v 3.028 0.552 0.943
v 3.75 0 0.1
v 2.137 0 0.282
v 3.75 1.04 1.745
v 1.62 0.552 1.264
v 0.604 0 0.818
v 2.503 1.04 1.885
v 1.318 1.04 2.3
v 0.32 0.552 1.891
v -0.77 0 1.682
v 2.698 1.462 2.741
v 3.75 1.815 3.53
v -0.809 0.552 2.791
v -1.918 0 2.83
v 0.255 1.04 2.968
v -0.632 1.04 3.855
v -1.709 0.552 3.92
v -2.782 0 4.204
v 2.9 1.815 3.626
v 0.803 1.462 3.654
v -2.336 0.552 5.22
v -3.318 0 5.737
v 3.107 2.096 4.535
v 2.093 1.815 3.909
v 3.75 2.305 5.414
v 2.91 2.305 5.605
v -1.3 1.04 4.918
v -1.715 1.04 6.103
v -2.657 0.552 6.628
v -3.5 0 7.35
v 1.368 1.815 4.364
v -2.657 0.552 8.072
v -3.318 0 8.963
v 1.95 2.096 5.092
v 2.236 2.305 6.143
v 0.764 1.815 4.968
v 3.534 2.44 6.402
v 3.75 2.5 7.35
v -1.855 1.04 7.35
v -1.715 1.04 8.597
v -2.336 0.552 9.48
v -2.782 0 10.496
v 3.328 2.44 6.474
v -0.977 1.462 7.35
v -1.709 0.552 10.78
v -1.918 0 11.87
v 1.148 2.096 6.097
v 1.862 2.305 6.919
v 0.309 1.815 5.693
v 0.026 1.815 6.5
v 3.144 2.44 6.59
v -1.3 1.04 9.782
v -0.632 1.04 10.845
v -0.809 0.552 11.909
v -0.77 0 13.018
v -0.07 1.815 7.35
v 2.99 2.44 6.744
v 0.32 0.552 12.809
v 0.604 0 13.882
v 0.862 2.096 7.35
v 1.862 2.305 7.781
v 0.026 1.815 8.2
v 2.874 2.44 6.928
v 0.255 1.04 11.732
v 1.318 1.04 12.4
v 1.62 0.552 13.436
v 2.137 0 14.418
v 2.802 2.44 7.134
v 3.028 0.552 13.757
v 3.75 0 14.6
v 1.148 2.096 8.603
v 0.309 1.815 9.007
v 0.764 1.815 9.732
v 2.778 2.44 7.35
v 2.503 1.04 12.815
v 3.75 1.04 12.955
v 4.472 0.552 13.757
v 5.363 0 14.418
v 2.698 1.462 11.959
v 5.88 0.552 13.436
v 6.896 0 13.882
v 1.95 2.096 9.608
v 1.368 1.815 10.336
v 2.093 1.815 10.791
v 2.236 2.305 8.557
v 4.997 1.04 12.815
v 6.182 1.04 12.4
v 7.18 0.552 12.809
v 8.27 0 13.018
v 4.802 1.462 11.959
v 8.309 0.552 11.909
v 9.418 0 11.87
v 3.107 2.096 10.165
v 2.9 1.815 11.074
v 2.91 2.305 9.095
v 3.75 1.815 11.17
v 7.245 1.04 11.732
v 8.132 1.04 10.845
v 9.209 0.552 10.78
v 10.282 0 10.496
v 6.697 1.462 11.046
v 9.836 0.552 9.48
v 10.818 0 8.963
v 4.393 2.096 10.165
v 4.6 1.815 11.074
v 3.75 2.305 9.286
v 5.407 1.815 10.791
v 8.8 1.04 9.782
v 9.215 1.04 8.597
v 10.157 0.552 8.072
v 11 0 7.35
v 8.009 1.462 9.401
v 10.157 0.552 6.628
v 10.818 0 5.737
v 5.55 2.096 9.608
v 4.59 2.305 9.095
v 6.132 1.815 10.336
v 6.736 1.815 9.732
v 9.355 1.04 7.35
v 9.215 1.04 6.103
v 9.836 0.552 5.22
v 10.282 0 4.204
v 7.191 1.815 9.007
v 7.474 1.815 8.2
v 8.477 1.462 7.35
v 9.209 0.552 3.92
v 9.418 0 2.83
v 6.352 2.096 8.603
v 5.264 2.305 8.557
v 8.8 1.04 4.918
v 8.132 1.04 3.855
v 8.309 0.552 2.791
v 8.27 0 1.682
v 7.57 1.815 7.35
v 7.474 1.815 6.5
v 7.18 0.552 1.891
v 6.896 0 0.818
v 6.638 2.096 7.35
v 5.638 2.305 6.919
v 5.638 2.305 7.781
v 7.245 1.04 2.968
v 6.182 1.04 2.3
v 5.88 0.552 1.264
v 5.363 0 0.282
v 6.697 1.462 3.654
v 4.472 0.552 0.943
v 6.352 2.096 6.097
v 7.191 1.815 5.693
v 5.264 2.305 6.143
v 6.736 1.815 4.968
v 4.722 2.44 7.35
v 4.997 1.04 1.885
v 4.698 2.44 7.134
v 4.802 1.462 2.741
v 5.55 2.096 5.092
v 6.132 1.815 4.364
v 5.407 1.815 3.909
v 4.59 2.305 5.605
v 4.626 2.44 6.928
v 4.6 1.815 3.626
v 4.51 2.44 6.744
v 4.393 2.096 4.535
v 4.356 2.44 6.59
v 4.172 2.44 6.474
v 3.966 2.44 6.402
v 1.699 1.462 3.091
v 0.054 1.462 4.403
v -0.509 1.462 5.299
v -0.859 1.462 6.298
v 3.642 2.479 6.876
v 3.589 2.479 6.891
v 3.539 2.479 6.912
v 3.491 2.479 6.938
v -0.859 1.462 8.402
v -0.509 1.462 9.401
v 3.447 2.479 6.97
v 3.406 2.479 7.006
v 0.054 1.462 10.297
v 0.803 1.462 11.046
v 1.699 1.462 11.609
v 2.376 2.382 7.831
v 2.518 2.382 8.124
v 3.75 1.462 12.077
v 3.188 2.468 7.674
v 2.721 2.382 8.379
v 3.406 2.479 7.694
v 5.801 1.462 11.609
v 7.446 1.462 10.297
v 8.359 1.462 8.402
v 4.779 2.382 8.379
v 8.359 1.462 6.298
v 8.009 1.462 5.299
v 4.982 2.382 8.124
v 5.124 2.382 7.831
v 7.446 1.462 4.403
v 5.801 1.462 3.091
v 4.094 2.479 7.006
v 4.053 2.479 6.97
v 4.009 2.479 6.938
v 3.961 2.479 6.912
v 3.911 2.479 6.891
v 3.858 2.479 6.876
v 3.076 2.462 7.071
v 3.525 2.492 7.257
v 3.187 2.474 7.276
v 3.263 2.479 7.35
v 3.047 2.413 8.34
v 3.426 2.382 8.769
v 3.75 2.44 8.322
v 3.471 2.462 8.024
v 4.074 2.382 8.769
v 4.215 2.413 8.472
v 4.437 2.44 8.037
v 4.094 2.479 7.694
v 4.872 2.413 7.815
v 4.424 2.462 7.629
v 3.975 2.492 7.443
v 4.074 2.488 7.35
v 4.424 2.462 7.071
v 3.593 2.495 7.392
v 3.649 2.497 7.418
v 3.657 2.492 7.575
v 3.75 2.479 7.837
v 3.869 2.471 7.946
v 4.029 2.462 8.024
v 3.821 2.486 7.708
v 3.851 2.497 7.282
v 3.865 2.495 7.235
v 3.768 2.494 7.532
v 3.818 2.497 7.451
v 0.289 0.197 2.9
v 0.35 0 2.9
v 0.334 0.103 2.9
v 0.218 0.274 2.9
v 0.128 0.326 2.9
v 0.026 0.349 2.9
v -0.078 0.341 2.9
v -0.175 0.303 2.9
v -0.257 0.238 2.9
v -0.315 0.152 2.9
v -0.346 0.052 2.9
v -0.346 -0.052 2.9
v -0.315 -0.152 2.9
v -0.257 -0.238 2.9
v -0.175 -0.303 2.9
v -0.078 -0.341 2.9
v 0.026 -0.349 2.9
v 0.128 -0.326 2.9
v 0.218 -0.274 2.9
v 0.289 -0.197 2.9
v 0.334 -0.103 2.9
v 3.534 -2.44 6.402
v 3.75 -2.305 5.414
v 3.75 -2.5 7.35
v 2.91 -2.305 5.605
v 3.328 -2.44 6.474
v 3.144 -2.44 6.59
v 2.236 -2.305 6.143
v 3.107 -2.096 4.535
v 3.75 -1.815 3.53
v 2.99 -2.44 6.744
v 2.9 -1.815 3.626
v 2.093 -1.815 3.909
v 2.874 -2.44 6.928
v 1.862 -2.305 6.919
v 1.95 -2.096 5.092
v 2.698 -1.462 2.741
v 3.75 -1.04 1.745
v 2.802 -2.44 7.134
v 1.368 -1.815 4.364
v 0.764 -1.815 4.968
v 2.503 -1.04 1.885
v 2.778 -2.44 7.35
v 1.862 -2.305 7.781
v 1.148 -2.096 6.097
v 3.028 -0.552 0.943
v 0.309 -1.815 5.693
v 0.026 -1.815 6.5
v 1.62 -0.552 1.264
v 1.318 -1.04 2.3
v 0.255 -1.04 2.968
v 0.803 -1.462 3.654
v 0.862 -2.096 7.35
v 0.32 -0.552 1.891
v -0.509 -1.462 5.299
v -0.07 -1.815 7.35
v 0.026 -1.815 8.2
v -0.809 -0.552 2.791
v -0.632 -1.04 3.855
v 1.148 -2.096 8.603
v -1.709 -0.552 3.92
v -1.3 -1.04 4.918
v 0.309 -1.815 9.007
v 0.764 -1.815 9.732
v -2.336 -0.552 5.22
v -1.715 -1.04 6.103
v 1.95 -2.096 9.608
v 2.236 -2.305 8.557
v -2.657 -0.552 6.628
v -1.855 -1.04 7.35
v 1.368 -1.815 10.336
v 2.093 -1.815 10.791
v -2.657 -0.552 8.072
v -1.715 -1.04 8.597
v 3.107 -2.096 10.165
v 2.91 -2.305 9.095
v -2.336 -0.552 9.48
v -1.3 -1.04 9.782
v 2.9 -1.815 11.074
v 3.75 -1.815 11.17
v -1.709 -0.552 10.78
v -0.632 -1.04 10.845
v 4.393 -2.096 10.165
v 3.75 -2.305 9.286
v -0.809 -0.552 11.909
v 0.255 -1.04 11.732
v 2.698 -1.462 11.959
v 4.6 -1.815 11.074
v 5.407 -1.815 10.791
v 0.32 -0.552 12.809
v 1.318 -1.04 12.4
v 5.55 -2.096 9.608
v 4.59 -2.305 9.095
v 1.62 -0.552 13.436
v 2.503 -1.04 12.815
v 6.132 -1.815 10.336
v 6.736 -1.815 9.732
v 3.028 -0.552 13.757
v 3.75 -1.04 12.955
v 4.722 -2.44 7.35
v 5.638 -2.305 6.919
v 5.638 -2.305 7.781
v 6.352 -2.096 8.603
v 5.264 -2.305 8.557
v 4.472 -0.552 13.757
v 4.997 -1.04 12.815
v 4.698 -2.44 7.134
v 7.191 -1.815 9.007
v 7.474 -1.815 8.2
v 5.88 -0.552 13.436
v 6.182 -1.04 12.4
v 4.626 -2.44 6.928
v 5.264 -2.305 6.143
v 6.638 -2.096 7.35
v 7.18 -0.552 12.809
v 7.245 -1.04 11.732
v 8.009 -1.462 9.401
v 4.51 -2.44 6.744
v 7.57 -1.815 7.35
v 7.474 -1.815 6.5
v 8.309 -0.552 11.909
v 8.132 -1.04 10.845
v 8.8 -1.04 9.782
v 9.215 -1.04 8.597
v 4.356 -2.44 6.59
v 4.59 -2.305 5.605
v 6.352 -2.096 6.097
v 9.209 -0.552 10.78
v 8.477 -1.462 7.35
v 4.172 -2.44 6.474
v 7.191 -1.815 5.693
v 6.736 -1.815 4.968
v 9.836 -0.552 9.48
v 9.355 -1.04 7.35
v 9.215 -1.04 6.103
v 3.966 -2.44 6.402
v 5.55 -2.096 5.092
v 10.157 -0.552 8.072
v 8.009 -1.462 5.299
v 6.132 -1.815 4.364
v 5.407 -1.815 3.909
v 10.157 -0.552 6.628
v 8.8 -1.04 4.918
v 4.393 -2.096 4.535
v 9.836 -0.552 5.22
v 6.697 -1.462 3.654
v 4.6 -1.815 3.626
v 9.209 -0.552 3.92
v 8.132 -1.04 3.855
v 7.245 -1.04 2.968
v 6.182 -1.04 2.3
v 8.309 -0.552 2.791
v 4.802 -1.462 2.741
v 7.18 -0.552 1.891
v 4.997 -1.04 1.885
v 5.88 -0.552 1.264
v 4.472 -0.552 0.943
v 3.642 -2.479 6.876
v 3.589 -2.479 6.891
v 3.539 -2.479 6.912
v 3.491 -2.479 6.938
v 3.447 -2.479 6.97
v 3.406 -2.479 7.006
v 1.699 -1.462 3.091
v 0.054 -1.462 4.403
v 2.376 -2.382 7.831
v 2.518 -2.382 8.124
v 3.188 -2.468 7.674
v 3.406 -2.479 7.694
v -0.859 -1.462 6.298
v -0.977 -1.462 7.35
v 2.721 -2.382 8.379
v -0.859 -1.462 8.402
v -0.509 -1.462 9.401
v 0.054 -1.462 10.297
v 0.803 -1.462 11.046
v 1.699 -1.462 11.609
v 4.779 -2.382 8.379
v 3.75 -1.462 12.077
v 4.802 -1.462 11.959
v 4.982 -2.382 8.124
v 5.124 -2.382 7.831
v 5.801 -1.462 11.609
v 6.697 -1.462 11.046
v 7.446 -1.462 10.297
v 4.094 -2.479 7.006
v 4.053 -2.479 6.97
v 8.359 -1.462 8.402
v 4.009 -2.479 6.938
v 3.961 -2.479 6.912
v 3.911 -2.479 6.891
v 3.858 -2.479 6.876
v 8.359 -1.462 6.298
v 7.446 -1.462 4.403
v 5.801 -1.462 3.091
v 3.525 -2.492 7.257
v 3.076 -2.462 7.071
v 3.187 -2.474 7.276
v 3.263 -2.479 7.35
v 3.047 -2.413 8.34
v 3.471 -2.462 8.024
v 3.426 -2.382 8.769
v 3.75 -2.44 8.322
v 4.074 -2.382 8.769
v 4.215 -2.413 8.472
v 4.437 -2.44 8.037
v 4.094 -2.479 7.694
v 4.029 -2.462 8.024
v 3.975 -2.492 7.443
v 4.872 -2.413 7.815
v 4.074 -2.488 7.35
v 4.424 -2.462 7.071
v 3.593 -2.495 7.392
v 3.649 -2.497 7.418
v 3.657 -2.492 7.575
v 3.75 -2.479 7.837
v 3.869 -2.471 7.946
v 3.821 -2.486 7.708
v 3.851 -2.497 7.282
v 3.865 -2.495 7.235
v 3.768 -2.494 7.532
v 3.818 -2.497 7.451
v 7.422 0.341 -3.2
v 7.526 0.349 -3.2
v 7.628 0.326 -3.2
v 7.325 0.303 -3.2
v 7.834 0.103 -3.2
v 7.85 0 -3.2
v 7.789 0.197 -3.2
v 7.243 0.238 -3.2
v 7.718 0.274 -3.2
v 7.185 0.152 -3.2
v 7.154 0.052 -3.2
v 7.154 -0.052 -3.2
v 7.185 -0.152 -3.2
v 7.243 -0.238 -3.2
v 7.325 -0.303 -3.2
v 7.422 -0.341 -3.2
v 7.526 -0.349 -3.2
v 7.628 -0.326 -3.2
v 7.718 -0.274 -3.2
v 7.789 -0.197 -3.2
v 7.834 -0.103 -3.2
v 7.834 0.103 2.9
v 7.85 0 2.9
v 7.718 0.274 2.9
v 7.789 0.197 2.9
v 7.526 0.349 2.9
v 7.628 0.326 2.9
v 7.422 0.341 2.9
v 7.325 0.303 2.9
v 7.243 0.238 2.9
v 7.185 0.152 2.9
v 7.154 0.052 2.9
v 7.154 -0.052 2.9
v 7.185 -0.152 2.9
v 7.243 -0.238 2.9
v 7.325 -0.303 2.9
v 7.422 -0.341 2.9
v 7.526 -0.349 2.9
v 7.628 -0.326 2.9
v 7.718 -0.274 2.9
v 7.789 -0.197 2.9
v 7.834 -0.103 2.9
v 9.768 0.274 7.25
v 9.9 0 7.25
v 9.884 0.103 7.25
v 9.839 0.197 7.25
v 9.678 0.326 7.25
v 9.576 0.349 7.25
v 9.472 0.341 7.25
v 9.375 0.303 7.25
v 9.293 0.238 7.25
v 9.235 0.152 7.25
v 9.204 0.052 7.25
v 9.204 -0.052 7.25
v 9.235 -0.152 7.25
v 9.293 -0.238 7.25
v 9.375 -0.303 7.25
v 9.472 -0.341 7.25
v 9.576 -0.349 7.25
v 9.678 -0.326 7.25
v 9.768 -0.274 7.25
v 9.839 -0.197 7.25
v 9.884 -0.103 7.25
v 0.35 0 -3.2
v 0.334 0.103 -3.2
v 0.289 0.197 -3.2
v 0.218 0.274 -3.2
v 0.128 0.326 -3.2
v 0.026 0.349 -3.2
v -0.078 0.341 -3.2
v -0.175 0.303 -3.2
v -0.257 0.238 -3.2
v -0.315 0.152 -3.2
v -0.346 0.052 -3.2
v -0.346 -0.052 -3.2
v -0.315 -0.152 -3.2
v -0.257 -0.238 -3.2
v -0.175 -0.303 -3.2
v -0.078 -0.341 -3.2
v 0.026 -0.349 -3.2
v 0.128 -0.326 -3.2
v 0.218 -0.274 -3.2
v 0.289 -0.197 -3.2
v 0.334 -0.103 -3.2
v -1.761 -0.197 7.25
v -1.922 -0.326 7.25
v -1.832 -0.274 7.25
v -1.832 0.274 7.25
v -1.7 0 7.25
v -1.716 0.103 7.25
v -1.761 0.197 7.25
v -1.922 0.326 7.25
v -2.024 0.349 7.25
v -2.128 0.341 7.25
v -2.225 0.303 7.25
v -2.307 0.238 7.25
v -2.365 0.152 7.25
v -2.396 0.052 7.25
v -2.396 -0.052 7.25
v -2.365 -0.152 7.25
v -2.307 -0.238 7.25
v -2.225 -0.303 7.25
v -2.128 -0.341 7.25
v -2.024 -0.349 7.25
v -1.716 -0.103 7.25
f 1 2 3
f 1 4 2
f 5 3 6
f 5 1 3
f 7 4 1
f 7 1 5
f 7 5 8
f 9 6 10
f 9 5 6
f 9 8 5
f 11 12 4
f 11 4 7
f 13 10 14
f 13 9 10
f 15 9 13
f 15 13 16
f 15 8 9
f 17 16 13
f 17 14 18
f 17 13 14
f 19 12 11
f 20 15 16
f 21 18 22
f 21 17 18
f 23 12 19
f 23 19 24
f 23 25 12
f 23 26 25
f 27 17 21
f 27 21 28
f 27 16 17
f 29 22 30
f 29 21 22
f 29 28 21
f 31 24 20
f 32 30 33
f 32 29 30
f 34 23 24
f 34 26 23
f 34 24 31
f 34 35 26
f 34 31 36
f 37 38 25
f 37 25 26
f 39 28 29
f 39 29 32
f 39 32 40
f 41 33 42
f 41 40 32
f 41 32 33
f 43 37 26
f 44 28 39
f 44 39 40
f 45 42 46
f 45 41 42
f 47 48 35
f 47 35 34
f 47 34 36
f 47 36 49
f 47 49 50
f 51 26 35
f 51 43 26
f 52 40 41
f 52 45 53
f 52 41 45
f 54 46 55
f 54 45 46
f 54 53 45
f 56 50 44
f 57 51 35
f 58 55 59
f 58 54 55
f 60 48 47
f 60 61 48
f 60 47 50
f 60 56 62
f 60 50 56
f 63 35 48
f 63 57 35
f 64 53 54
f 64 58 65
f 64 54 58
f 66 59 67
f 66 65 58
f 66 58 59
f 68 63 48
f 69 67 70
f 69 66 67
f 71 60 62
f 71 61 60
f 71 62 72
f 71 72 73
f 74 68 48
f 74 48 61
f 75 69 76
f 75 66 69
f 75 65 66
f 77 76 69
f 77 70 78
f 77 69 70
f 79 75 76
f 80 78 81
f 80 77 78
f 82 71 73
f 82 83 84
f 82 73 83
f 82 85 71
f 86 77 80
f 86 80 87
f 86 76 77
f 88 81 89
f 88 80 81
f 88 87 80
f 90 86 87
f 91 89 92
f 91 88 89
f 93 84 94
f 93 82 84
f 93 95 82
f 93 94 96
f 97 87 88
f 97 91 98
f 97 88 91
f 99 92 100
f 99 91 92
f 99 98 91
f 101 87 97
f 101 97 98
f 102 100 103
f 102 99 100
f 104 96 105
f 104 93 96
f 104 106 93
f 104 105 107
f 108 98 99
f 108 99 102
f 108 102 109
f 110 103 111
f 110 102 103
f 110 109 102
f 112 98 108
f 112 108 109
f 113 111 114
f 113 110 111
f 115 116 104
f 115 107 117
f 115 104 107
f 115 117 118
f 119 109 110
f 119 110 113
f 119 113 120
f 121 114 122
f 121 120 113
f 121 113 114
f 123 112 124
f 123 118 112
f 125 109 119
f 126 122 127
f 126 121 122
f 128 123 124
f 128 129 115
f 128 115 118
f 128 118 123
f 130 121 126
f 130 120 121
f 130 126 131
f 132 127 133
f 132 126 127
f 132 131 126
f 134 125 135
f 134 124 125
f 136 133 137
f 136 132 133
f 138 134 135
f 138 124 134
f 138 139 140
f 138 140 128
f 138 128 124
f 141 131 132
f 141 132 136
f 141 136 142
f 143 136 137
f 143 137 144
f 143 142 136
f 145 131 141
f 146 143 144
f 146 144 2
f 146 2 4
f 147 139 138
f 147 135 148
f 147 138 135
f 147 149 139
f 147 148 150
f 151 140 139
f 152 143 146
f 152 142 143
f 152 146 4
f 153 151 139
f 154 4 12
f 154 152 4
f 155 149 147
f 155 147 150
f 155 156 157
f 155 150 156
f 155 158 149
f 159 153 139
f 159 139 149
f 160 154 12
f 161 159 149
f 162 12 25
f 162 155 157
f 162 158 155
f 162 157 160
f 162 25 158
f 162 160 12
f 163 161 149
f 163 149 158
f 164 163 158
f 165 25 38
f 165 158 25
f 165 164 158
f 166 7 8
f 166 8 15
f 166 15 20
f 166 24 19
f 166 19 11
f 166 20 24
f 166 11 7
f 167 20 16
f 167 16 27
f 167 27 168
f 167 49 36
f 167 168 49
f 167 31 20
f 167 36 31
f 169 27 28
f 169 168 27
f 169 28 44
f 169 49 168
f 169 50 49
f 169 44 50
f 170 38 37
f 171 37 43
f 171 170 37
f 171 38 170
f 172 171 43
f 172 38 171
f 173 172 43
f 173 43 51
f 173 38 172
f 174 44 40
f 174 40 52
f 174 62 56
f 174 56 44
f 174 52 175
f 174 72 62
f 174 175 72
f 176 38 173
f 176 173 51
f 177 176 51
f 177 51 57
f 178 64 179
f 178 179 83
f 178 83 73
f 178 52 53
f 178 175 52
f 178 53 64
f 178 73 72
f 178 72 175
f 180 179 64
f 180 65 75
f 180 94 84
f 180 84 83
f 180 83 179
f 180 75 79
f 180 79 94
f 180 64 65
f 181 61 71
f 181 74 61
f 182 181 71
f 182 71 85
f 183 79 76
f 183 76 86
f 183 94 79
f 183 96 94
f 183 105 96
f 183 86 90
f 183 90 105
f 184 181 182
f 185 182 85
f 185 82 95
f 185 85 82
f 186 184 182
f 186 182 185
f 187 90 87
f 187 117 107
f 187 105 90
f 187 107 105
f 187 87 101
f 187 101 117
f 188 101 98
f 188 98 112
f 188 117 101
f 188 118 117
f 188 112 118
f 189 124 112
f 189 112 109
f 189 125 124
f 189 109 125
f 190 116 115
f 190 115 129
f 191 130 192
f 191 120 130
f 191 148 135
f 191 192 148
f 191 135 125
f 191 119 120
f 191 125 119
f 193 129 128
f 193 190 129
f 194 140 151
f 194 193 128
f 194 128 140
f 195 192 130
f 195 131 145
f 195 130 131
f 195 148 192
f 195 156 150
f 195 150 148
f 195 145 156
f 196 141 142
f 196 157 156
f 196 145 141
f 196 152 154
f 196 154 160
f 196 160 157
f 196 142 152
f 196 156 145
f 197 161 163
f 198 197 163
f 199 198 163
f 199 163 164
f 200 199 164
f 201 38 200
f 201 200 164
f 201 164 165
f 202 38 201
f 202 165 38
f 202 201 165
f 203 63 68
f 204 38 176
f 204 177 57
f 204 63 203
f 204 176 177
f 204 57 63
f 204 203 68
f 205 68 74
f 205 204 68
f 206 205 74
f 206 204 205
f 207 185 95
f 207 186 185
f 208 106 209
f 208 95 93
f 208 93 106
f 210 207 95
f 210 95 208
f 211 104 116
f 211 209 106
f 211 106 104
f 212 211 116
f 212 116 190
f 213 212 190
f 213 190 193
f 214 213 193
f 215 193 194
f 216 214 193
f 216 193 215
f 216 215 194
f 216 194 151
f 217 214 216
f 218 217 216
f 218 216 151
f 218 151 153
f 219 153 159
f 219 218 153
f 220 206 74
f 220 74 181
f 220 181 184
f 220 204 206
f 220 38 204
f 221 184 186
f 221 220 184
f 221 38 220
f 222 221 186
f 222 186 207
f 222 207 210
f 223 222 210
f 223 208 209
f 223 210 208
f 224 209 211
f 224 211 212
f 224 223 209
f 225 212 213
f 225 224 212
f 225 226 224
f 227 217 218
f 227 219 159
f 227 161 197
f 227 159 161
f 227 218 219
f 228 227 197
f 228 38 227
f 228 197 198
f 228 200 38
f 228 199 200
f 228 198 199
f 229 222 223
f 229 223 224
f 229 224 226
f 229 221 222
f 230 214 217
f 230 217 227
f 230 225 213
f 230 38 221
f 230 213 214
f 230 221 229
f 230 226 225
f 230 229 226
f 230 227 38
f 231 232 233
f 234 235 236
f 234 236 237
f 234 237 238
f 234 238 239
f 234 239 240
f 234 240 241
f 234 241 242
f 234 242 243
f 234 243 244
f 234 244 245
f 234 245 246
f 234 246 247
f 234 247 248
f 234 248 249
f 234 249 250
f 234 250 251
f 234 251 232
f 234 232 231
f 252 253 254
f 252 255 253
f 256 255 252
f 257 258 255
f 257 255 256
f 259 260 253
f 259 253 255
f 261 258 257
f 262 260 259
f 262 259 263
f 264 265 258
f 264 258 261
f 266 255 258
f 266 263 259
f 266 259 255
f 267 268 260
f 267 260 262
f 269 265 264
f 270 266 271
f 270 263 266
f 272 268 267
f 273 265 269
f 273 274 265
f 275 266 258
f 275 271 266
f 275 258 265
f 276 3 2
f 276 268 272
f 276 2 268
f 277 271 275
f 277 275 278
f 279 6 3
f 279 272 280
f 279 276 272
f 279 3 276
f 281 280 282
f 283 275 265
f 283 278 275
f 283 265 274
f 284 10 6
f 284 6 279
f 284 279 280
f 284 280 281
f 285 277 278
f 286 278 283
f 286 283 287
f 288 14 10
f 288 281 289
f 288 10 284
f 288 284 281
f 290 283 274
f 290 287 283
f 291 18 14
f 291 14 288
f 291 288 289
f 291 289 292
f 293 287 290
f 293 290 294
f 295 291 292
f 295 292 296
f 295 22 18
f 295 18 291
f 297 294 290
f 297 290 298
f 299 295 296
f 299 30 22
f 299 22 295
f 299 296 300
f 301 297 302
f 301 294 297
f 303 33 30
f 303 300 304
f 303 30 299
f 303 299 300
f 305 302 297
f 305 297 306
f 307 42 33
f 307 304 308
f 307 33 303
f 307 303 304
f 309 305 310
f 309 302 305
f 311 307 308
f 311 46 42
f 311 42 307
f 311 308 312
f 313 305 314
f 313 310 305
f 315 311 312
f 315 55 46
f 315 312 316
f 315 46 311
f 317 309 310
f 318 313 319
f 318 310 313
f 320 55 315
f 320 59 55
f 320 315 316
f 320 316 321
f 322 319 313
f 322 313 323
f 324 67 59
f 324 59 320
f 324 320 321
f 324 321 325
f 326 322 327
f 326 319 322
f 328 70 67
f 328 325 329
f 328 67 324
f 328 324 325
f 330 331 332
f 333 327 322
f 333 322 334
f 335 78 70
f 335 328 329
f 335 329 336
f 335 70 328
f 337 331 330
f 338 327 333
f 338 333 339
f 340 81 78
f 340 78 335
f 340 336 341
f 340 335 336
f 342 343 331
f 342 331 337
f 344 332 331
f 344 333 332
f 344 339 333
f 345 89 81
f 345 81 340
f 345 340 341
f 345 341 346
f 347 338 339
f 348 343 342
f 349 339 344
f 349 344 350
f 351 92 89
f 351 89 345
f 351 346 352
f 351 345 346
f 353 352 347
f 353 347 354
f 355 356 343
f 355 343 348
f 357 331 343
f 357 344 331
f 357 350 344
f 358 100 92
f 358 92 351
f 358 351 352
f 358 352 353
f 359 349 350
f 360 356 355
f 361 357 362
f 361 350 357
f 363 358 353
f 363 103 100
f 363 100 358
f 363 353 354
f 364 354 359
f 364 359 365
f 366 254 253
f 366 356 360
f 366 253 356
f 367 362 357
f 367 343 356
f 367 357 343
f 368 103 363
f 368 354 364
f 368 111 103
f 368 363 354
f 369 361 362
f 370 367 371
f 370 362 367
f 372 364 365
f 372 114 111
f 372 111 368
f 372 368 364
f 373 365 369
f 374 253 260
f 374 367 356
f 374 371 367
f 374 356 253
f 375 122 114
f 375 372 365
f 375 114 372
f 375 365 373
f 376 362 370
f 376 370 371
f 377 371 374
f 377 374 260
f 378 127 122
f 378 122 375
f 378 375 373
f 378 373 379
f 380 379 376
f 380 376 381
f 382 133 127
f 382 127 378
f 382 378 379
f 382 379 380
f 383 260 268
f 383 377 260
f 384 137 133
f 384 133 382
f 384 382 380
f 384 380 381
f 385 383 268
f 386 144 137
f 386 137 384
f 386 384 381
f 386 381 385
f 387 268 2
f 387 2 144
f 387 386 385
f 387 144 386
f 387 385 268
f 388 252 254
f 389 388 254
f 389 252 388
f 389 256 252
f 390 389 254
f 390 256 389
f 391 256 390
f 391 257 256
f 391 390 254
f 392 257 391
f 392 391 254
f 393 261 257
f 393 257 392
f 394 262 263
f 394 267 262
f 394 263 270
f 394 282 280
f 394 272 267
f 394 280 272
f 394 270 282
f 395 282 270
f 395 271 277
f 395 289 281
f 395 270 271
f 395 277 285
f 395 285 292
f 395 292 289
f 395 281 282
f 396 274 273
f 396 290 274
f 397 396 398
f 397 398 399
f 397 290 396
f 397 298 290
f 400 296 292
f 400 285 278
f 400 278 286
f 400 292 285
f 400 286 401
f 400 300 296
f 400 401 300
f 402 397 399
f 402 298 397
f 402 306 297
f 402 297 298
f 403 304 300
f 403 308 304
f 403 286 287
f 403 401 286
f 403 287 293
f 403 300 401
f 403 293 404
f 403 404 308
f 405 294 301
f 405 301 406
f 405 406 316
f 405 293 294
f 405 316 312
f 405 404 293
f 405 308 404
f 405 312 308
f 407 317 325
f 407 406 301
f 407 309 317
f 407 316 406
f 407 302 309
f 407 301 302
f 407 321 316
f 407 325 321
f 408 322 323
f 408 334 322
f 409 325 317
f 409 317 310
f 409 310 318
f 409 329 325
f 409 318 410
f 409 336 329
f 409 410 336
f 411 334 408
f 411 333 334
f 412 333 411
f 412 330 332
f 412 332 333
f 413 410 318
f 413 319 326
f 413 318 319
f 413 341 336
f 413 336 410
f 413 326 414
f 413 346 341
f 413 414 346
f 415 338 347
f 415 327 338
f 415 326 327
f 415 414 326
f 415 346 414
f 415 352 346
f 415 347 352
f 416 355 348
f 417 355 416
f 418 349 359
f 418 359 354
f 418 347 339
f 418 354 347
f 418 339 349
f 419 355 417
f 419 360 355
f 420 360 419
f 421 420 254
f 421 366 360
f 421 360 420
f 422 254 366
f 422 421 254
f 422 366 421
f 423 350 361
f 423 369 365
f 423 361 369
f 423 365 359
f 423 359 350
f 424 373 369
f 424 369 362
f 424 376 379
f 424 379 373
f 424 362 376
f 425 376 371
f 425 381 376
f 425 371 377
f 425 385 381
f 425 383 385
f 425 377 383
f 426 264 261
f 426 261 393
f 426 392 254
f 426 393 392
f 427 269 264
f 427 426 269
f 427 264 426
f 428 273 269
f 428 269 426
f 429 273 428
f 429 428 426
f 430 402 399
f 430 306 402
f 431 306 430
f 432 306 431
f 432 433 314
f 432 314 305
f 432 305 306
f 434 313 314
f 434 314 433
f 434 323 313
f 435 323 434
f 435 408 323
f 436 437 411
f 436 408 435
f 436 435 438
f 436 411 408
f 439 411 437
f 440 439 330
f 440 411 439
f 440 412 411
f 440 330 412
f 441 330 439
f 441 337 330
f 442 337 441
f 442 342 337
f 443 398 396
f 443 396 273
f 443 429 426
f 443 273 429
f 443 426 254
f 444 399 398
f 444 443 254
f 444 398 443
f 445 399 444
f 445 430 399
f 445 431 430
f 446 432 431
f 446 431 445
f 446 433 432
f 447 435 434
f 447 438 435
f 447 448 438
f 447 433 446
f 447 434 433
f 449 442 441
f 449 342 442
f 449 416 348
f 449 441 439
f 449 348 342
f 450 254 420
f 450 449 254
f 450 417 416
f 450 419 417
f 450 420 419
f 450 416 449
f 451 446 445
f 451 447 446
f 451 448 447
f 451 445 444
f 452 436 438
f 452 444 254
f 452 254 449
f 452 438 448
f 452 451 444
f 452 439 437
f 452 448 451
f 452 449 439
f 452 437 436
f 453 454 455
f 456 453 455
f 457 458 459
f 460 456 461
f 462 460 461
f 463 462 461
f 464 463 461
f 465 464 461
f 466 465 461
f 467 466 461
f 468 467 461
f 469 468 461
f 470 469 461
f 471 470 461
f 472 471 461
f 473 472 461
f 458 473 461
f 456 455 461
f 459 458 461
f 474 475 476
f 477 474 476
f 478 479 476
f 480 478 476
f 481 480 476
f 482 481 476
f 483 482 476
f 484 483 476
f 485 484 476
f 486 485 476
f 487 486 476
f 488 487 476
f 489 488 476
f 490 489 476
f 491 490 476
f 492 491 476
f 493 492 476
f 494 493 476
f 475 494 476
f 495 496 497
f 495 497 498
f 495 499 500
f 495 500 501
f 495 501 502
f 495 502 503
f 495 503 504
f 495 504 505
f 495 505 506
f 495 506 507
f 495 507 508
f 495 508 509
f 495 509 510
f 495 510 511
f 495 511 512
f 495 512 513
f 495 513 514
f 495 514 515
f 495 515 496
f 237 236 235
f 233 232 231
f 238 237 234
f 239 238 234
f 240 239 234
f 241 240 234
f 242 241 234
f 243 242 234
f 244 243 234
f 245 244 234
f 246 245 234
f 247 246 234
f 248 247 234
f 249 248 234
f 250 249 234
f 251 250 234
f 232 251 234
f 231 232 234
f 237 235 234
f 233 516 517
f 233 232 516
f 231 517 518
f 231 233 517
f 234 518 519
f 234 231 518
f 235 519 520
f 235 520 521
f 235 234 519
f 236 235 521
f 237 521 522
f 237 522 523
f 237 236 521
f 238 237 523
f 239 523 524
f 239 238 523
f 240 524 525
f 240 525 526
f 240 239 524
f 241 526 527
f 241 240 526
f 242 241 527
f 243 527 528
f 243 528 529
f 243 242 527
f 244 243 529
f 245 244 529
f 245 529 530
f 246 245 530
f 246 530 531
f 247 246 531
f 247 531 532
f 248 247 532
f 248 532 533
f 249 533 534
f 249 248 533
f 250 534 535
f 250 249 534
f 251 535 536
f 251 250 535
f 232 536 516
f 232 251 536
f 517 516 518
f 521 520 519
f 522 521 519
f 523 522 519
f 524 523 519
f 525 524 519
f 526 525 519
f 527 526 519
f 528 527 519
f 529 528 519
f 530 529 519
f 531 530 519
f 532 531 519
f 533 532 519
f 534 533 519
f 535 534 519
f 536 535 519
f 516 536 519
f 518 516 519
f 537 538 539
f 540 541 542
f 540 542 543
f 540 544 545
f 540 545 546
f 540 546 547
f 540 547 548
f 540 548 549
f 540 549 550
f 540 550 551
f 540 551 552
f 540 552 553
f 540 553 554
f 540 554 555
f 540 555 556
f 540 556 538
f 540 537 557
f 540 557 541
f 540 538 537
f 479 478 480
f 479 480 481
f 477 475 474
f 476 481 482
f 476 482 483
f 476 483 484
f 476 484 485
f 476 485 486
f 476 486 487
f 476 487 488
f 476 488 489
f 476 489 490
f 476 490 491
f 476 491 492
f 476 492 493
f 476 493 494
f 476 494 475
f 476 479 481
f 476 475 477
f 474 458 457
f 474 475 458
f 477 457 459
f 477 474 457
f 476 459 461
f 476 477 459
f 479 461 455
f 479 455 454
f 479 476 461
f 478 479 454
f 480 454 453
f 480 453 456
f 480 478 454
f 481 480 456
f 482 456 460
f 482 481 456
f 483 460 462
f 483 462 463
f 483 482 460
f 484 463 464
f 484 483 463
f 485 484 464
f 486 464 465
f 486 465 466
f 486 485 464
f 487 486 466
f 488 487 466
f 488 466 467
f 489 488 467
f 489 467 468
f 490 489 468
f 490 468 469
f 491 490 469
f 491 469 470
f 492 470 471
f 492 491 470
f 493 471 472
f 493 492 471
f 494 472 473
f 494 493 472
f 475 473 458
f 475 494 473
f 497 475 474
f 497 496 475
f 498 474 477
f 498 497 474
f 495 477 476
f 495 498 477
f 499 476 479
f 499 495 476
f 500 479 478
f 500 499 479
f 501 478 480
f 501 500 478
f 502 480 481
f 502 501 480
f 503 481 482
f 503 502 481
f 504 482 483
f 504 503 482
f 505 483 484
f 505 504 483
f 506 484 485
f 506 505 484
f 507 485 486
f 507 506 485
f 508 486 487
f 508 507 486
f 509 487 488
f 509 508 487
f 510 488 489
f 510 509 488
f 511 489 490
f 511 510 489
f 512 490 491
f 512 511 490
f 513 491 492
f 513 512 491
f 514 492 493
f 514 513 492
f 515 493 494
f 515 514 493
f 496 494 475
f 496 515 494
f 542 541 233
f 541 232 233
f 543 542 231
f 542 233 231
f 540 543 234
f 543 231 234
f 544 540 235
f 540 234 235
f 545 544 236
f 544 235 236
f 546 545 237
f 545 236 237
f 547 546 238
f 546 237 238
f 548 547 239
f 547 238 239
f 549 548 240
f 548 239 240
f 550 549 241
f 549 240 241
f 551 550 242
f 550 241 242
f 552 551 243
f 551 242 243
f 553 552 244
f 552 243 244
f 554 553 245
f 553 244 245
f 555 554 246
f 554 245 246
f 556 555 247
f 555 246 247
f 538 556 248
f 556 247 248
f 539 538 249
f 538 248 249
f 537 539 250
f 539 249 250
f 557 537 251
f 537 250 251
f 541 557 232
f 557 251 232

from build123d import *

# Parameters (mm, degrees)
SKETCH001_R       = 0.35
PAD001_DEPTH      = 2.9
PAD001_DEPTH_BACK = 3.2
SKETCH002_R       = 0.35
SKETCH003_R       = 0.35
SKETCH004_R       = 0.35
SKETCH005_R       = 0.35


with BuildPart() as pad001:
    # Sketch001 → Pad001 (new body, two sides)
    with BuildSketch(Plane.XY) as pad001_sk:
        Circle(SKETCH001_R)
        with Locations((7.5, 0)):
            Circle(SKETCH001_R)
    extrude(amount=PAD001_DEPTH)
    extrude(pad001_sk.sketch, amount=-PAD001_DEPTH_BACK)


with BuildPart() as revolution:
    # Sketch → Revolution (revolve)
    with BuildSketch(Plane.YZ.offset(3.75)):
        with BuildLine():
            Line((-2.5, 7.35), (2.5, 7.35))
            ThreePointArc((0, 0.1), (1.814662, 3.530289), (2.5, 7.35))
            ThreePointArc((-2.5, 7.35), (-1.814662, 3.530289), (0, 0.1))
        make_face()
    revolve(axis=Axis((3.75, -3.32079, 7.35), (0, 1, 0)))


with BuildPart() as loft_body:
    # Sketch002 → Loft section 0
    with BuildSketch(Plane.XY.offset(7.25)):
        with Locations((-2.05, 0)):
            Circle(SKETCH002_R)
    # Sketch003 → Loft section 1
    with BuildSketch(Plane.XY.offset(2.9)):
        Circle(SKETCH003_R)
    loft()


with BuildPart() as loft001:
    # Sketch004 → Loft001 section 0
    with BuildSketch(Plane.XY.offset(2.9)):
        with Locations((7.5, 0)):
            Circle(SKETCH004_R)
    # Sketch005 → Loft001 section 1
    with BuildSketch(Plane.XY.offset(7.25)):
        with Locations((9.55, 0)):
            Circle(SKETCH005_R)
    loft()


solid = Compound([pad001.part, revolution.part, loft_body.part, loft001.part])
